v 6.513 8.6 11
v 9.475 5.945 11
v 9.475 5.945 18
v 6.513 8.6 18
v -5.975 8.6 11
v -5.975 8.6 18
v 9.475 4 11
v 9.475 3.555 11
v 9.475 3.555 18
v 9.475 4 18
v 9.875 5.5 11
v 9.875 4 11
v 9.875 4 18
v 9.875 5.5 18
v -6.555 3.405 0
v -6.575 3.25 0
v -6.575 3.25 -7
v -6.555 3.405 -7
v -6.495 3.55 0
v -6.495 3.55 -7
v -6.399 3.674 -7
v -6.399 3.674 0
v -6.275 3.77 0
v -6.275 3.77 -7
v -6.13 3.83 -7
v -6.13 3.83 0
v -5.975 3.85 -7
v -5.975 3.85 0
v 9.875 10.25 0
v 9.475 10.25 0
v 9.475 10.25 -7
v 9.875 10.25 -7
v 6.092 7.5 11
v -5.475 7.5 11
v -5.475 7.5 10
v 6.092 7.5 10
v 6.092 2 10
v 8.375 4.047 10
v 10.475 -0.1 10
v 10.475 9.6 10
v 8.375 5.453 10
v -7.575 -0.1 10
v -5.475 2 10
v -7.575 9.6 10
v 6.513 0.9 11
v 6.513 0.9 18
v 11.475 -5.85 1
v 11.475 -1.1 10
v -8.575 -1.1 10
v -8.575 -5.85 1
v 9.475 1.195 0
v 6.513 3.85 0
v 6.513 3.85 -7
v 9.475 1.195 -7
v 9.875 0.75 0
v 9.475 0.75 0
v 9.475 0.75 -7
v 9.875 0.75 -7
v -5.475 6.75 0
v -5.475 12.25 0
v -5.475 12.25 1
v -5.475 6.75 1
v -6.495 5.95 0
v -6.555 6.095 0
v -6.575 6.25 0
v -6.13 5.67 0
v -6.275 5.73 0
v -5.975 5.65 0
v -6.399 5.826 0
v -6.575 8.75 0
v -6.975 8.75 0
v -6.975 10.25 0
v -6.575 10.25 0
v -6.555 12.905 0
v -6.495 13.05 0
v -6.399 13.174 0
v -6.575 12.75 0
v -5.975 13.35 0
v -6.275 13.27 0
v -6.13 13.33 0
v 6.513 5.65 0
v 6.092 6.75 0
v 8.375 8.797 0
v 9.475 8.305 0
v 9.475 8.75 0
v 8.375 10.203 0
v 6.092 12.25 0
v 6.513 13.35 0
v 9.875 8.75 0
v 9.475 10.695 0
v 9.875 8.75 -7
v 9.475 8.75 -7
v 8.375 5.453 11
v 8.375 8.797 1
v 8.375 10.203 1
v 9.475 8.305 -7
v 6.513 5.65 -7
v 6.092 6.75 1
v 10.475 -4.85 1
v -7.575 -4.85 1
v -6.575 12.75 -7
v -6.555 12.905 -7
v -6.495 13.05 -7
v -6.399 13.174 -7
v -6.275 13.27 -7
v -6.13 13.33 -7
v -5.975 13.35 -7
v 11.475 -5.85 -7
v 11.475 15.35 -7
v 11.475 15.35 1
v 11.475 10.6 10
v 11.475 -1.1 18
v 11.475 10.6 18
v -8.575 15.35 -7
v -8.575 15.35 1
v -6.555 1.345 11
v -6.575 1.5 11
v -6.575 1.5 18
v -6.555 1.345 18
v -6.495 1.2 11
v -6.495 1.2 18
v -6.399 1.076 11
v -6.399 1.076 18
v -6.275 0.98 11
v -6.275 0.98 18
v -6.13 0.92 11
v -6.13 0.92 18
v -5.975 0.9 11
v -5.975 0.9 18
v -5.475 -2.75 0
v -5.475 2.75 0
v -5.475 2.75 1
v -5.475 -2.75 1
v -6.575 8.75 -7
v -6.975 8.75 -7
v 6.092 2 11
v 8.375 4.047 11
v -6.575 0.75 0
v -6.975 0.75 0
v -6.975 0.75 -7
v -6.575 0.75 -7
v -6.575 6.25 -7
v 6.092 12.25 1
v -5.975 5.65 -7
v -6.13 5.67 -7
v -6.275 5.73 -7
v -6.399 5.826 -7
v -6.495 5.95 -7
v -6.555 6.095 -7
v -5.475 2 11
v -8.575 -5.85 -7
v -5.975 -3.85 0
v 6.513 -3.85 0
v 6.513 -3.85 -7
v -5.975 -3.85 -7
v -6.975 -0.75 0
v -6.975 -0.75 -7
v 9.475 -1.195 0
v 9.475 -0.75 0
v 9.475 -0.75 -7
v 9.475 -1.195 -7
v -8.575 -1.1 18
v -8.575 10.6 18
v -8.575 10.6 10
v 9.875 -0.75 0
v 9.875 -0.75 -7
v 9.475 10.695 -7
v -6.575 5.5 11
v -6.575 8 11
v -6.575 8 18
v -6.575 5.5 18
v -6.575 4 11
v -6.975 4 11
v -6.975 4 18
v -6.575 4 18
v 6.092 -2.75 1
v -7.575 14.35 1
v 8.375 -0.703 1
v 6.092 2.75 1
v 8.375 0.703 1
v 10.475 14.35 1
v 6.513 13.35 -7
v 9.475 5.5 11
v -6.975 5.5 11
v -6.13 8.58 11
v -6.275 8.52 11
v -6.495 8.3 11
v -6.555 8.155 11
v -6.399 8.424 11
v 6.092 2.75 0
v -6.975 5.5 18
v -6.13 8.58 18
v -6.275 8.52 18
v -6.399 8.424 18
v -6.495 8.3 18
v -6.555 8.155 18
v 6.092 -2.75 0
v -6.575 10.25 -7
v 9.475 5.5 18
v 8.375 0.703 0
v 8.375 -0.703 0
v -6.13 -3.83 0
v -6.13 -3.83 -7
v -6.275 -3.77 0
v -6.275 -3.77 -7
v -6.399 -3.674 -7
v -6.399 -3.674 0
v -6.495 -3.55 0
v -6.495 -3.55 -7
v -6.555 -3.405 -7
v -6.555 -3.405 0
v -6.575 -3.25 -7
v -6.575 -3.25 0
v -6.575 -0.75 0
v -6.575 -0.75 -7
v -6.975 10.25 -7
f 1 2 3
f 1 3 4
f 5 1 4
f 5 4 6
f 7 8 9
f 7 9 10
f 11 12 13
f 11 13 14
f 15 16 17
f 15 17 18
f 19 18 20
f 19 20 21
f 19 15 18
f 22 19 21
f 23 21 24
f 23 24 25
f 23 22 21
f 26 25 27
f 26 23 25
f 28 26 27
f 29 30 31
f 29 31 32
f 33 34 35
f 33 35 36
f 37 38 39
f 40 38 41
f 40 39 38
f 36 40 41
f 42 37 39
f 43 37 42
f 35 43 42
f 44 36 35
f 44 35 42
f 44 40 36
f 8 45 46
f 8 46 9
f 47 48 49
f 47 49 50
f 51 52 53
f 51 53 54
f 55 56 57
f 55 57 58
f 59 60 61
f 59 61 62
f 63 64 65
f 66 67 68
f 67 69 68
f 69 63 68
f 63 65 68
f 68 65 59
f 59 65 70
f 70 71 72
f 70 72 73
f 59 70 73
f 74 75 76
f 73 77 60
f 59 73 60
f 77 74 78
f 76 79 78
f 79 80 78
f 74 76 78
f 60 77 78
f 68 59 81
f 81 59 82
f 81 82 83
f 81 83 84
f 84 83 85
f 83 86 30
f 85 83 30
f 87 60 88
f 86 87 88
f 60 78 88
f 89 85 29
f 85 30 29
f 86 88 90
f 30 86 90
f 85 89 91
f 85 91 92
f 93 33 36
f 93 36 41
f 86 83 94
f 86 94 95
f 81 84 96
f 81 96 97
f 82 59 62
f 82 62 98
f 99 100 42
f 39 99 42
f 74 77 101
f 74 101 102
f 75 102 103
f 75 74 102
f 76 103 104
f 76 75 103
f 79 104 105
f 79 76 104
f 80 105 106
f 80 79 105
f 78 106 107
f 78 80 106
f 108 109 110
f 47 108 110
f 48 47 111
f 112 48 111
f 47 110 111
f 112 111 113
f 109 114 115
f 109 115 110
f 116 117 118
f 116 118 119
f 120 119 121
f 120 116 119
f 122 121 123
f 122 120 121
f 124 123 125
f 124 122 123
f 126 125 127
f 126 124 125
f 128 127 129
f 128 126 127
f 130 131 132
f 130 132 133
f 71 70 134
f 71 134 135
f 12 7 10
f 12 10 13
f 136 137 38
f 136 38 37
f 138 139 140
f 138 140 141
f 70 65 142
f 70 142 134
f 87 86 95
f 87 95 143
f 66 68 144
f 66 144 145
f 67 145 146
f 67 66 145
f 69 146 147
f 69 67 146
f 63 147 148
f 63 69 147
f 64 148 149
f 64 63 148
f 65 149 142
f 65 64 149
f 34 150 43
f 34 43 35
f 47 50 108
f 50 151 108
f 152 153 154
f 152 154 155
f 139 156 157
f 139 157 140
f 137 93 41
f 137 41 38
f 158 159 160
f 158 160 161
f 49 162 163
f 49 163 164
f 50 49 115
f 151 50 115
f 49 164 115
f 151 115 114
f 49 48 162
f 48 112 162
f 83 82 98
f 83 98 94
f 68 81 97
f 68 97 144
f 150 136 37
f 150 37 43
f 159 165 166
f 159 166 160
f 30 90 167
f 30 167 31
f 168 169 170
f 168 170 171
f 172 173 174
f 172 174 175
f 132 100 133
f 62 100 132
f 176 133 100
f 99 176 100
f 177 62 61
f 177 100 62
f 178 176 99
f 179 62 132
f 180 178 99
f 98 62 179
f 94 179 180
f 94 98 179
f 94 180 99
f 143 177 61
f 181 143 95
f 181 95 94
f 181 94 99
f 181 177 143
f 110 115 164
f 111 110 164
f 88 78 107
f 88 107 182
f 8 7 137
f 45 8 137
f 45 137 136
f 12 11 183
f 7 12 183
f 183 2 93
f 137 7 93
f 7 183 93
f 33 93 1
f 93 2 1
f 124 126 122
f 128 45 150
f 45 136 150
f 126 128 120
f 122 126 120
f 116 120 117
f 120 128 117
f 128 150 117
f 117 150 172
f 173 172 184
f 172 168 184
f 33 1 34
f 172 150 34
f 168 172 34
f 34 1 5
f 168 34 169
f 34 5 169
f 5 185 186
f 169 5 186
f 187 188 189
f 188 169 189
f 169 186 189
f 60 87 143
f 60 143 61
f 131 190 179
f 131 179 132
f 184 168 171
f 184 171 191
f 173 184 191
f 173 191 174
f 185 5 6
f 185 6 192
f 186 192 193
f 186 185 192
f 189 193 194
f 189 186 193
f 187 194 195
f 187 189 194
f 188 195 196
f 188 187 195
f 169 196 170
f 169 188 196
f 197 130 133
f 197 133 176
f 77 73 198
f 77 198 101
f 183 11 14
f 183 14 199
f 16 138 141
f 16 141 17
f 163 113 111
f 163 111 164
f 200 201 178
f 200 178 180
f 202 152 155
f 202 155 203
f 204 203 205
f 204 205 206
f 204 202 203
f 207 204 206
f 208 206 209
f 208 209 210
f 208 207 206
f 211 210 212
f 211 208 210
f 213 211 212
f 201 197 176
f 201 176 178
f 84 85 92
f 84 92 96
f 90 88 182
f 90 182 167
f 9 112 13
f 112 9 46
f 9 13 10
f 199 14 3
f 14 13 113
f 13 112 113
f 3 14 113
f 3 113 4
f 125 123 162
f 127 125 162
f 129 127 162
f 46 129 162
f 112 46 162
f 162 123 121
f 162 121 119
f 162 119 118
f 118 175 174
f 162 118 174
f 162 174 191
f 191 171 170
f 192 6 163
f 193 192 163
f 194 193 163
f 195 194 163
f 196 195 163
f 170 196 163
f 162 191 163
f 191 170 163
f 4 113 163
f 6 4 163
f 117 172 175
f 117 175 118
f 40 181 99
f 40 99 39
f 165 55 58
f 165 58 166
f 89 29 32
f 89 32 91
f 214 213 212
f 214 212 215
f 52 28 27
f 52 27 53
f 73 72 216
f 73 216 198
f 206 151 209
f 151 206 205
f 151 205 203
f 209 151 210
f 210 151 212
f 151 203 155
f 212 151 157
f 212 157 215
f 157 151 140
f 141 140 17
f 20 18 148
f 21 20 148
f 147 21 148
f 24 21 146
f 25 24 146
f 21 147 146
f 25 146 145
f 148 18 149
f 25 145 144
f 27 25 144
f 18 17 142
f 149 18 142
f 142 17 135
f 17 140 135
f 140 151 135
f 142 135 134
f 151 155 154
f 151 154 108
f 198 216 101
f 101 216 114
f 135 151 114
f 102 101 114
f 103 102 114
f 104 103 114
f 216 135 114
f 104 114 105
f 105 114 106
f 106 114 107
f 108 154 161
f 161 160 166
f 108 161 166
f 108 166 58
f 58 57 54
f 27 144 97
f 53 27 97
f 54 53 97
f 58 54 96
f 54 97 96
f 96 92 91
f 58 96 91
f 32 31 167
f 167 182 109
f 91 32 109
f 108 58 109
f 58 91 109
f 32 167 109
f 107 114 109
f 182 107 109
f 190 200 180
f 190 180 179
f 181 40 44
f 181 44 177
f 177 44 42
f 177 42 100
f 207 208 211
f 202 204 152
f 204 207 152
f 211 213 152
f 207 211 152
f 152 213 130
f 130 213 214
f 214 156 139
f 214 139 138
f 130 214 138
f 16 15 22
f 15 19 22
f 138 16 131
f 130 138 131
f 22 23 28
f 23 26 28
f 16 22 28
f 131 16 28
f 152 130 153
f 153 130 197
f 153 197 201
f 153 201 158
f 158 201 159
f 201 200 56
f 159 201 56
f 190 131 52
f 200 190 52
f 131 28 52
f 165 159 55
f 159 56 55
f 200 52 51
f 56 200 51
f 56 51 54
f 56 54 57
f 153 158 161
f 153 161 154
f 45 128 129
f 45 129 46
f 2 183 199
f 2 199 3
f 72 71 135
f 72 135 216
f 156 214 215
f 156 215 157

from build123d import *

# Parameters (mm, degrees)
SKETCH1_W           = 20.05
SKETCH1_H           = 21.2
BOSS_EXTRUDE1_DEPTH = 7
SKETCH2_W           = 20.05
SKETCH2_H           = 21.2
BOSS_EXTRUDE2_DEPTH = 1
SKETCH3_W           = 20.05
SKETCH3_H           = 11.7
BOSS_EXTRUDE3_DEPTH = 7
SKETCH4_W           = 20.05
SKETCH4_H           = 11.7
BOSS_EXTRUDE4_DEPTH = 1
BOSS_EXTRUDE5_DEPTH = 20.05
BOSS_EXTRUDE6_DEPTH = 1
BOSS_EXTRUDE7_DEPTH = 1


with BuildPart() as part:
    # Sketch1 → Boss-Extrude1 (new body)
    with BuildSketch(Plane.XY):
        with Locations((1.45, 4.75)):
            Rectangle(SKETCH1_W, SKETCH1_H)
        with BuildLine():
            Line((-5.975, 3.85), (6.51326417, 3.85))
            Line((6.51326417, 3.85), (9.475, 1.194650635))
            Line((9.475, 1.194650635), (9.475, 0.75))
            Line((9.475, 0.75), (9.875, 0.75))
            Line((9.875, 0.75), (9.875, -0.75))
            Line((9.875, -0.75), (9.475, -0.75))
            Line((9.475, -0.75), (9.475, -1.194650635))
            Line((9.475, -1.194650635), (6.51326417, -3.85))
            Line((6.51326417, -3.85), (-5.975, -3.85))
            ThreePointArc((-5.975, -3.85), (-6.399264069, -3.674264069), (-6.575, -3.25))
            Line((-6.575, -3.25), (-6.575, -0.75))
            Line((-6.575, -0.75), (-6.975, -0.75))
            Line((-6.975, -0.75), (-6.975, 0.75))
            Line((-6.975, 0.75), (-6.575, 0.75))
            Line((-6.575, 0.75), (-6.575, 3.25))
            ThreePointArc((-6.575, 3.25), (-6.399264069, 3.674264069), (-5.975, 3.85))
        make_face(mode=Mode.SUBTRACT)
        with BuildLine():
            Line((-5.975, 13.35), (6.51326417, 13.35))
            Line((6.51326417, 13.35), (9.475, 10.694650635))
            Line((9.475, 10.694650635), (9.475, 10.25))
            Line((9.475, 10.25), (9.875, 10.25))
            Line((9.875, 10.25), (9.875, 8.75))
            Line((9.875, 8.75), (9.475, 8.75))
            Line((9.475, 8.75), (9.475, 8.305349365))
            Line((9.475, 8.305349365), (6.51326417, 5.65))
            Line((6.51326417, 5.65), (-5.975, 5.65))
            ThreePointArc((-5.975, 5.65), (-6.399264069, 5.825735931), (-6.575, 6.25))
            Line((-6.575, 6.25), (-6.575, 8.75))
            Line((-6.575, 8.75), (-6.975, 8.75))
            Line((-6.975, 8.75), (-6.975, 10.25))
            Line((-6.975, 10.25), (-6.575, 10.25))
            Line((-6.575, 10.25), (-6.575, 12.75))
            ThreePointArc((-6.575, 12.75), (-6.399264069, 13.174264069), (-5.975, 13.35))
        make_face(mode=Mode.SUBTRACT)
    extrude(amount=-BOSS_EXTRUDE1_DEPTH)

    # Sketch2 → Boss-Extrude2 (add)
    with BuildSketch(Plane.XY):
        with Locations((1.45, 4.75)):
            Rectangle(SKETCH2_W, SKETCH2_H)
        Polygon((6.0923583, 2.75), (-5.475, 2.75), (-5.475, -2.75), (6.0923583, -2.75), (8.375, -0.703493649), (8.375, 0.703493649), align=None, mode=Mode.SUBTRACT)
        Polygon((6.0923583, 12.25), (-5.475, 12.25), (-5.475, 6.75), (6.0923583, 6.75), (8.375, 8.796506351), (8.375, 10.203493649), align=None, mode=Mode.SUBTRACT)
    extrude(amount=BOSS_EXTRUDE2_DEPTH)



with BuildPart() as body_2:
    # Sketch3 → Boss-Extrude3 (new body)
    with BuildSketch(Plane(origin=(0, 0, 11), x_dir=(-1, 0, 0), z_dir=(0, 0, -1))):
        with Locations((-1.45, 4.75)):
            Rectangle(SKETCH3_W, SKETCH3_H)
        with BuildLine():
            Line((6.975, 4), (6.575, 4))
            Line((6.575, 4), (6.575, 1.5))
            ThreePointArc((6.575, 1.5), (6.399264069, 1.075735931), (5.975, 0.9))
            Line((5.975, 0.9), (-6.51326417, 0.9))
            Line((-6.51326417, 0.9), (-9.475, 3.555349365))
            Line((-9.475, 3.555349365), (-9.475, 4))
            Line((-9.475, 4), (-9.875, 4))
            Line((-9.875, 4), (-9.875, 5.5))
            Line((-9.875, 5.5), (-9.475, 5.5))
            Line((-9.475, 5.5), (-9.475, 5.944650635))
            Line((-9.475, 5.944650635), (-6.51326417, 8.6))
            Line((-6.51326417, 8.6), (5.975, 8.6))
            ThreePointArc((5.975, 8.6), (6.399264069, 8.424264069), (6.575, 8))
            Line((6.575, 8), (6.575, 5.5))
            Line((6.575, 5.5), (6.975, 5.5))
            Line((6.975, 5.5), (6.975, 4))
        make_face(mode=Mode.SUBTRACT)
    extrude(amount=-BOSS_EXTRUDE3_DEPTH)

    # Sketch4 → Boss-Extrude4 (add)
    with BuildSketch(Plane(origin=(0, 0, 11), x_dir=(-1, 0, 0), z_dir=(0, 0, -1))):
        with Locations((-1.45, 4.75)):
            Rectangle(SKETCH4_W, SKETCH4_H)
        Polygon((-6.0923583, 2), (5.475, 2), (5.475, 7.5), (-6.0923583, 7.5), (-8.375, 5.453493649), (-8.375, 4.046506351), align=None, mode=Mode.SUBTRACT)
    extrude(amount=BOSS_EXTRUDE4_DEPTH)


with BuildPart() as part_1:
    add(part.part)

    add(body_2.part)  # Boss-Extrude5 merges body 2
    # Sketch5 → Boss-Extrude5 (add)
    with BuildSketch(Plane(origin=(11.475, 0, 0), x_dir=(0, 0, -1), z_dir=(1, 0, 0))):
        Polygon((-10, -1.1), (-1, -5.85), (-1, -4.85), (-10, -0.1), align=None)
        Polygon((-10, 9.6), (-1, 14.35), (-1, 15.35), (-10, 10.6), align=None)
    extrude(amount=-BOSS_EXTRUDE5_DEPTH)

    # Sketch6 → Boss-Extrude6 (add)
    with BuildSketch(Plane(origin=(11.475, 0, 0), x_dir=(0, 0, -1), z_dir=(1, 0, 0))):
        Polygon((-10, 9.6), (-1, 14.35), (-1, -4.85), (-10, -0.1), align=None)
    extrude(amount=-BOSS_EXTRUDE6_DEPTH)

    # Sketch7 → Boss-Extrude7 (add)
    with BuildSketch(Plane.ZY.offset(8.575)):
        Polygon((1, -4.85), (1, 14.35), (10, 9.6), (10, -0.1), align=None)
    extrude(amount=-BOSS_EXTRUDE7_DEPTH)


solid = part_1.part
